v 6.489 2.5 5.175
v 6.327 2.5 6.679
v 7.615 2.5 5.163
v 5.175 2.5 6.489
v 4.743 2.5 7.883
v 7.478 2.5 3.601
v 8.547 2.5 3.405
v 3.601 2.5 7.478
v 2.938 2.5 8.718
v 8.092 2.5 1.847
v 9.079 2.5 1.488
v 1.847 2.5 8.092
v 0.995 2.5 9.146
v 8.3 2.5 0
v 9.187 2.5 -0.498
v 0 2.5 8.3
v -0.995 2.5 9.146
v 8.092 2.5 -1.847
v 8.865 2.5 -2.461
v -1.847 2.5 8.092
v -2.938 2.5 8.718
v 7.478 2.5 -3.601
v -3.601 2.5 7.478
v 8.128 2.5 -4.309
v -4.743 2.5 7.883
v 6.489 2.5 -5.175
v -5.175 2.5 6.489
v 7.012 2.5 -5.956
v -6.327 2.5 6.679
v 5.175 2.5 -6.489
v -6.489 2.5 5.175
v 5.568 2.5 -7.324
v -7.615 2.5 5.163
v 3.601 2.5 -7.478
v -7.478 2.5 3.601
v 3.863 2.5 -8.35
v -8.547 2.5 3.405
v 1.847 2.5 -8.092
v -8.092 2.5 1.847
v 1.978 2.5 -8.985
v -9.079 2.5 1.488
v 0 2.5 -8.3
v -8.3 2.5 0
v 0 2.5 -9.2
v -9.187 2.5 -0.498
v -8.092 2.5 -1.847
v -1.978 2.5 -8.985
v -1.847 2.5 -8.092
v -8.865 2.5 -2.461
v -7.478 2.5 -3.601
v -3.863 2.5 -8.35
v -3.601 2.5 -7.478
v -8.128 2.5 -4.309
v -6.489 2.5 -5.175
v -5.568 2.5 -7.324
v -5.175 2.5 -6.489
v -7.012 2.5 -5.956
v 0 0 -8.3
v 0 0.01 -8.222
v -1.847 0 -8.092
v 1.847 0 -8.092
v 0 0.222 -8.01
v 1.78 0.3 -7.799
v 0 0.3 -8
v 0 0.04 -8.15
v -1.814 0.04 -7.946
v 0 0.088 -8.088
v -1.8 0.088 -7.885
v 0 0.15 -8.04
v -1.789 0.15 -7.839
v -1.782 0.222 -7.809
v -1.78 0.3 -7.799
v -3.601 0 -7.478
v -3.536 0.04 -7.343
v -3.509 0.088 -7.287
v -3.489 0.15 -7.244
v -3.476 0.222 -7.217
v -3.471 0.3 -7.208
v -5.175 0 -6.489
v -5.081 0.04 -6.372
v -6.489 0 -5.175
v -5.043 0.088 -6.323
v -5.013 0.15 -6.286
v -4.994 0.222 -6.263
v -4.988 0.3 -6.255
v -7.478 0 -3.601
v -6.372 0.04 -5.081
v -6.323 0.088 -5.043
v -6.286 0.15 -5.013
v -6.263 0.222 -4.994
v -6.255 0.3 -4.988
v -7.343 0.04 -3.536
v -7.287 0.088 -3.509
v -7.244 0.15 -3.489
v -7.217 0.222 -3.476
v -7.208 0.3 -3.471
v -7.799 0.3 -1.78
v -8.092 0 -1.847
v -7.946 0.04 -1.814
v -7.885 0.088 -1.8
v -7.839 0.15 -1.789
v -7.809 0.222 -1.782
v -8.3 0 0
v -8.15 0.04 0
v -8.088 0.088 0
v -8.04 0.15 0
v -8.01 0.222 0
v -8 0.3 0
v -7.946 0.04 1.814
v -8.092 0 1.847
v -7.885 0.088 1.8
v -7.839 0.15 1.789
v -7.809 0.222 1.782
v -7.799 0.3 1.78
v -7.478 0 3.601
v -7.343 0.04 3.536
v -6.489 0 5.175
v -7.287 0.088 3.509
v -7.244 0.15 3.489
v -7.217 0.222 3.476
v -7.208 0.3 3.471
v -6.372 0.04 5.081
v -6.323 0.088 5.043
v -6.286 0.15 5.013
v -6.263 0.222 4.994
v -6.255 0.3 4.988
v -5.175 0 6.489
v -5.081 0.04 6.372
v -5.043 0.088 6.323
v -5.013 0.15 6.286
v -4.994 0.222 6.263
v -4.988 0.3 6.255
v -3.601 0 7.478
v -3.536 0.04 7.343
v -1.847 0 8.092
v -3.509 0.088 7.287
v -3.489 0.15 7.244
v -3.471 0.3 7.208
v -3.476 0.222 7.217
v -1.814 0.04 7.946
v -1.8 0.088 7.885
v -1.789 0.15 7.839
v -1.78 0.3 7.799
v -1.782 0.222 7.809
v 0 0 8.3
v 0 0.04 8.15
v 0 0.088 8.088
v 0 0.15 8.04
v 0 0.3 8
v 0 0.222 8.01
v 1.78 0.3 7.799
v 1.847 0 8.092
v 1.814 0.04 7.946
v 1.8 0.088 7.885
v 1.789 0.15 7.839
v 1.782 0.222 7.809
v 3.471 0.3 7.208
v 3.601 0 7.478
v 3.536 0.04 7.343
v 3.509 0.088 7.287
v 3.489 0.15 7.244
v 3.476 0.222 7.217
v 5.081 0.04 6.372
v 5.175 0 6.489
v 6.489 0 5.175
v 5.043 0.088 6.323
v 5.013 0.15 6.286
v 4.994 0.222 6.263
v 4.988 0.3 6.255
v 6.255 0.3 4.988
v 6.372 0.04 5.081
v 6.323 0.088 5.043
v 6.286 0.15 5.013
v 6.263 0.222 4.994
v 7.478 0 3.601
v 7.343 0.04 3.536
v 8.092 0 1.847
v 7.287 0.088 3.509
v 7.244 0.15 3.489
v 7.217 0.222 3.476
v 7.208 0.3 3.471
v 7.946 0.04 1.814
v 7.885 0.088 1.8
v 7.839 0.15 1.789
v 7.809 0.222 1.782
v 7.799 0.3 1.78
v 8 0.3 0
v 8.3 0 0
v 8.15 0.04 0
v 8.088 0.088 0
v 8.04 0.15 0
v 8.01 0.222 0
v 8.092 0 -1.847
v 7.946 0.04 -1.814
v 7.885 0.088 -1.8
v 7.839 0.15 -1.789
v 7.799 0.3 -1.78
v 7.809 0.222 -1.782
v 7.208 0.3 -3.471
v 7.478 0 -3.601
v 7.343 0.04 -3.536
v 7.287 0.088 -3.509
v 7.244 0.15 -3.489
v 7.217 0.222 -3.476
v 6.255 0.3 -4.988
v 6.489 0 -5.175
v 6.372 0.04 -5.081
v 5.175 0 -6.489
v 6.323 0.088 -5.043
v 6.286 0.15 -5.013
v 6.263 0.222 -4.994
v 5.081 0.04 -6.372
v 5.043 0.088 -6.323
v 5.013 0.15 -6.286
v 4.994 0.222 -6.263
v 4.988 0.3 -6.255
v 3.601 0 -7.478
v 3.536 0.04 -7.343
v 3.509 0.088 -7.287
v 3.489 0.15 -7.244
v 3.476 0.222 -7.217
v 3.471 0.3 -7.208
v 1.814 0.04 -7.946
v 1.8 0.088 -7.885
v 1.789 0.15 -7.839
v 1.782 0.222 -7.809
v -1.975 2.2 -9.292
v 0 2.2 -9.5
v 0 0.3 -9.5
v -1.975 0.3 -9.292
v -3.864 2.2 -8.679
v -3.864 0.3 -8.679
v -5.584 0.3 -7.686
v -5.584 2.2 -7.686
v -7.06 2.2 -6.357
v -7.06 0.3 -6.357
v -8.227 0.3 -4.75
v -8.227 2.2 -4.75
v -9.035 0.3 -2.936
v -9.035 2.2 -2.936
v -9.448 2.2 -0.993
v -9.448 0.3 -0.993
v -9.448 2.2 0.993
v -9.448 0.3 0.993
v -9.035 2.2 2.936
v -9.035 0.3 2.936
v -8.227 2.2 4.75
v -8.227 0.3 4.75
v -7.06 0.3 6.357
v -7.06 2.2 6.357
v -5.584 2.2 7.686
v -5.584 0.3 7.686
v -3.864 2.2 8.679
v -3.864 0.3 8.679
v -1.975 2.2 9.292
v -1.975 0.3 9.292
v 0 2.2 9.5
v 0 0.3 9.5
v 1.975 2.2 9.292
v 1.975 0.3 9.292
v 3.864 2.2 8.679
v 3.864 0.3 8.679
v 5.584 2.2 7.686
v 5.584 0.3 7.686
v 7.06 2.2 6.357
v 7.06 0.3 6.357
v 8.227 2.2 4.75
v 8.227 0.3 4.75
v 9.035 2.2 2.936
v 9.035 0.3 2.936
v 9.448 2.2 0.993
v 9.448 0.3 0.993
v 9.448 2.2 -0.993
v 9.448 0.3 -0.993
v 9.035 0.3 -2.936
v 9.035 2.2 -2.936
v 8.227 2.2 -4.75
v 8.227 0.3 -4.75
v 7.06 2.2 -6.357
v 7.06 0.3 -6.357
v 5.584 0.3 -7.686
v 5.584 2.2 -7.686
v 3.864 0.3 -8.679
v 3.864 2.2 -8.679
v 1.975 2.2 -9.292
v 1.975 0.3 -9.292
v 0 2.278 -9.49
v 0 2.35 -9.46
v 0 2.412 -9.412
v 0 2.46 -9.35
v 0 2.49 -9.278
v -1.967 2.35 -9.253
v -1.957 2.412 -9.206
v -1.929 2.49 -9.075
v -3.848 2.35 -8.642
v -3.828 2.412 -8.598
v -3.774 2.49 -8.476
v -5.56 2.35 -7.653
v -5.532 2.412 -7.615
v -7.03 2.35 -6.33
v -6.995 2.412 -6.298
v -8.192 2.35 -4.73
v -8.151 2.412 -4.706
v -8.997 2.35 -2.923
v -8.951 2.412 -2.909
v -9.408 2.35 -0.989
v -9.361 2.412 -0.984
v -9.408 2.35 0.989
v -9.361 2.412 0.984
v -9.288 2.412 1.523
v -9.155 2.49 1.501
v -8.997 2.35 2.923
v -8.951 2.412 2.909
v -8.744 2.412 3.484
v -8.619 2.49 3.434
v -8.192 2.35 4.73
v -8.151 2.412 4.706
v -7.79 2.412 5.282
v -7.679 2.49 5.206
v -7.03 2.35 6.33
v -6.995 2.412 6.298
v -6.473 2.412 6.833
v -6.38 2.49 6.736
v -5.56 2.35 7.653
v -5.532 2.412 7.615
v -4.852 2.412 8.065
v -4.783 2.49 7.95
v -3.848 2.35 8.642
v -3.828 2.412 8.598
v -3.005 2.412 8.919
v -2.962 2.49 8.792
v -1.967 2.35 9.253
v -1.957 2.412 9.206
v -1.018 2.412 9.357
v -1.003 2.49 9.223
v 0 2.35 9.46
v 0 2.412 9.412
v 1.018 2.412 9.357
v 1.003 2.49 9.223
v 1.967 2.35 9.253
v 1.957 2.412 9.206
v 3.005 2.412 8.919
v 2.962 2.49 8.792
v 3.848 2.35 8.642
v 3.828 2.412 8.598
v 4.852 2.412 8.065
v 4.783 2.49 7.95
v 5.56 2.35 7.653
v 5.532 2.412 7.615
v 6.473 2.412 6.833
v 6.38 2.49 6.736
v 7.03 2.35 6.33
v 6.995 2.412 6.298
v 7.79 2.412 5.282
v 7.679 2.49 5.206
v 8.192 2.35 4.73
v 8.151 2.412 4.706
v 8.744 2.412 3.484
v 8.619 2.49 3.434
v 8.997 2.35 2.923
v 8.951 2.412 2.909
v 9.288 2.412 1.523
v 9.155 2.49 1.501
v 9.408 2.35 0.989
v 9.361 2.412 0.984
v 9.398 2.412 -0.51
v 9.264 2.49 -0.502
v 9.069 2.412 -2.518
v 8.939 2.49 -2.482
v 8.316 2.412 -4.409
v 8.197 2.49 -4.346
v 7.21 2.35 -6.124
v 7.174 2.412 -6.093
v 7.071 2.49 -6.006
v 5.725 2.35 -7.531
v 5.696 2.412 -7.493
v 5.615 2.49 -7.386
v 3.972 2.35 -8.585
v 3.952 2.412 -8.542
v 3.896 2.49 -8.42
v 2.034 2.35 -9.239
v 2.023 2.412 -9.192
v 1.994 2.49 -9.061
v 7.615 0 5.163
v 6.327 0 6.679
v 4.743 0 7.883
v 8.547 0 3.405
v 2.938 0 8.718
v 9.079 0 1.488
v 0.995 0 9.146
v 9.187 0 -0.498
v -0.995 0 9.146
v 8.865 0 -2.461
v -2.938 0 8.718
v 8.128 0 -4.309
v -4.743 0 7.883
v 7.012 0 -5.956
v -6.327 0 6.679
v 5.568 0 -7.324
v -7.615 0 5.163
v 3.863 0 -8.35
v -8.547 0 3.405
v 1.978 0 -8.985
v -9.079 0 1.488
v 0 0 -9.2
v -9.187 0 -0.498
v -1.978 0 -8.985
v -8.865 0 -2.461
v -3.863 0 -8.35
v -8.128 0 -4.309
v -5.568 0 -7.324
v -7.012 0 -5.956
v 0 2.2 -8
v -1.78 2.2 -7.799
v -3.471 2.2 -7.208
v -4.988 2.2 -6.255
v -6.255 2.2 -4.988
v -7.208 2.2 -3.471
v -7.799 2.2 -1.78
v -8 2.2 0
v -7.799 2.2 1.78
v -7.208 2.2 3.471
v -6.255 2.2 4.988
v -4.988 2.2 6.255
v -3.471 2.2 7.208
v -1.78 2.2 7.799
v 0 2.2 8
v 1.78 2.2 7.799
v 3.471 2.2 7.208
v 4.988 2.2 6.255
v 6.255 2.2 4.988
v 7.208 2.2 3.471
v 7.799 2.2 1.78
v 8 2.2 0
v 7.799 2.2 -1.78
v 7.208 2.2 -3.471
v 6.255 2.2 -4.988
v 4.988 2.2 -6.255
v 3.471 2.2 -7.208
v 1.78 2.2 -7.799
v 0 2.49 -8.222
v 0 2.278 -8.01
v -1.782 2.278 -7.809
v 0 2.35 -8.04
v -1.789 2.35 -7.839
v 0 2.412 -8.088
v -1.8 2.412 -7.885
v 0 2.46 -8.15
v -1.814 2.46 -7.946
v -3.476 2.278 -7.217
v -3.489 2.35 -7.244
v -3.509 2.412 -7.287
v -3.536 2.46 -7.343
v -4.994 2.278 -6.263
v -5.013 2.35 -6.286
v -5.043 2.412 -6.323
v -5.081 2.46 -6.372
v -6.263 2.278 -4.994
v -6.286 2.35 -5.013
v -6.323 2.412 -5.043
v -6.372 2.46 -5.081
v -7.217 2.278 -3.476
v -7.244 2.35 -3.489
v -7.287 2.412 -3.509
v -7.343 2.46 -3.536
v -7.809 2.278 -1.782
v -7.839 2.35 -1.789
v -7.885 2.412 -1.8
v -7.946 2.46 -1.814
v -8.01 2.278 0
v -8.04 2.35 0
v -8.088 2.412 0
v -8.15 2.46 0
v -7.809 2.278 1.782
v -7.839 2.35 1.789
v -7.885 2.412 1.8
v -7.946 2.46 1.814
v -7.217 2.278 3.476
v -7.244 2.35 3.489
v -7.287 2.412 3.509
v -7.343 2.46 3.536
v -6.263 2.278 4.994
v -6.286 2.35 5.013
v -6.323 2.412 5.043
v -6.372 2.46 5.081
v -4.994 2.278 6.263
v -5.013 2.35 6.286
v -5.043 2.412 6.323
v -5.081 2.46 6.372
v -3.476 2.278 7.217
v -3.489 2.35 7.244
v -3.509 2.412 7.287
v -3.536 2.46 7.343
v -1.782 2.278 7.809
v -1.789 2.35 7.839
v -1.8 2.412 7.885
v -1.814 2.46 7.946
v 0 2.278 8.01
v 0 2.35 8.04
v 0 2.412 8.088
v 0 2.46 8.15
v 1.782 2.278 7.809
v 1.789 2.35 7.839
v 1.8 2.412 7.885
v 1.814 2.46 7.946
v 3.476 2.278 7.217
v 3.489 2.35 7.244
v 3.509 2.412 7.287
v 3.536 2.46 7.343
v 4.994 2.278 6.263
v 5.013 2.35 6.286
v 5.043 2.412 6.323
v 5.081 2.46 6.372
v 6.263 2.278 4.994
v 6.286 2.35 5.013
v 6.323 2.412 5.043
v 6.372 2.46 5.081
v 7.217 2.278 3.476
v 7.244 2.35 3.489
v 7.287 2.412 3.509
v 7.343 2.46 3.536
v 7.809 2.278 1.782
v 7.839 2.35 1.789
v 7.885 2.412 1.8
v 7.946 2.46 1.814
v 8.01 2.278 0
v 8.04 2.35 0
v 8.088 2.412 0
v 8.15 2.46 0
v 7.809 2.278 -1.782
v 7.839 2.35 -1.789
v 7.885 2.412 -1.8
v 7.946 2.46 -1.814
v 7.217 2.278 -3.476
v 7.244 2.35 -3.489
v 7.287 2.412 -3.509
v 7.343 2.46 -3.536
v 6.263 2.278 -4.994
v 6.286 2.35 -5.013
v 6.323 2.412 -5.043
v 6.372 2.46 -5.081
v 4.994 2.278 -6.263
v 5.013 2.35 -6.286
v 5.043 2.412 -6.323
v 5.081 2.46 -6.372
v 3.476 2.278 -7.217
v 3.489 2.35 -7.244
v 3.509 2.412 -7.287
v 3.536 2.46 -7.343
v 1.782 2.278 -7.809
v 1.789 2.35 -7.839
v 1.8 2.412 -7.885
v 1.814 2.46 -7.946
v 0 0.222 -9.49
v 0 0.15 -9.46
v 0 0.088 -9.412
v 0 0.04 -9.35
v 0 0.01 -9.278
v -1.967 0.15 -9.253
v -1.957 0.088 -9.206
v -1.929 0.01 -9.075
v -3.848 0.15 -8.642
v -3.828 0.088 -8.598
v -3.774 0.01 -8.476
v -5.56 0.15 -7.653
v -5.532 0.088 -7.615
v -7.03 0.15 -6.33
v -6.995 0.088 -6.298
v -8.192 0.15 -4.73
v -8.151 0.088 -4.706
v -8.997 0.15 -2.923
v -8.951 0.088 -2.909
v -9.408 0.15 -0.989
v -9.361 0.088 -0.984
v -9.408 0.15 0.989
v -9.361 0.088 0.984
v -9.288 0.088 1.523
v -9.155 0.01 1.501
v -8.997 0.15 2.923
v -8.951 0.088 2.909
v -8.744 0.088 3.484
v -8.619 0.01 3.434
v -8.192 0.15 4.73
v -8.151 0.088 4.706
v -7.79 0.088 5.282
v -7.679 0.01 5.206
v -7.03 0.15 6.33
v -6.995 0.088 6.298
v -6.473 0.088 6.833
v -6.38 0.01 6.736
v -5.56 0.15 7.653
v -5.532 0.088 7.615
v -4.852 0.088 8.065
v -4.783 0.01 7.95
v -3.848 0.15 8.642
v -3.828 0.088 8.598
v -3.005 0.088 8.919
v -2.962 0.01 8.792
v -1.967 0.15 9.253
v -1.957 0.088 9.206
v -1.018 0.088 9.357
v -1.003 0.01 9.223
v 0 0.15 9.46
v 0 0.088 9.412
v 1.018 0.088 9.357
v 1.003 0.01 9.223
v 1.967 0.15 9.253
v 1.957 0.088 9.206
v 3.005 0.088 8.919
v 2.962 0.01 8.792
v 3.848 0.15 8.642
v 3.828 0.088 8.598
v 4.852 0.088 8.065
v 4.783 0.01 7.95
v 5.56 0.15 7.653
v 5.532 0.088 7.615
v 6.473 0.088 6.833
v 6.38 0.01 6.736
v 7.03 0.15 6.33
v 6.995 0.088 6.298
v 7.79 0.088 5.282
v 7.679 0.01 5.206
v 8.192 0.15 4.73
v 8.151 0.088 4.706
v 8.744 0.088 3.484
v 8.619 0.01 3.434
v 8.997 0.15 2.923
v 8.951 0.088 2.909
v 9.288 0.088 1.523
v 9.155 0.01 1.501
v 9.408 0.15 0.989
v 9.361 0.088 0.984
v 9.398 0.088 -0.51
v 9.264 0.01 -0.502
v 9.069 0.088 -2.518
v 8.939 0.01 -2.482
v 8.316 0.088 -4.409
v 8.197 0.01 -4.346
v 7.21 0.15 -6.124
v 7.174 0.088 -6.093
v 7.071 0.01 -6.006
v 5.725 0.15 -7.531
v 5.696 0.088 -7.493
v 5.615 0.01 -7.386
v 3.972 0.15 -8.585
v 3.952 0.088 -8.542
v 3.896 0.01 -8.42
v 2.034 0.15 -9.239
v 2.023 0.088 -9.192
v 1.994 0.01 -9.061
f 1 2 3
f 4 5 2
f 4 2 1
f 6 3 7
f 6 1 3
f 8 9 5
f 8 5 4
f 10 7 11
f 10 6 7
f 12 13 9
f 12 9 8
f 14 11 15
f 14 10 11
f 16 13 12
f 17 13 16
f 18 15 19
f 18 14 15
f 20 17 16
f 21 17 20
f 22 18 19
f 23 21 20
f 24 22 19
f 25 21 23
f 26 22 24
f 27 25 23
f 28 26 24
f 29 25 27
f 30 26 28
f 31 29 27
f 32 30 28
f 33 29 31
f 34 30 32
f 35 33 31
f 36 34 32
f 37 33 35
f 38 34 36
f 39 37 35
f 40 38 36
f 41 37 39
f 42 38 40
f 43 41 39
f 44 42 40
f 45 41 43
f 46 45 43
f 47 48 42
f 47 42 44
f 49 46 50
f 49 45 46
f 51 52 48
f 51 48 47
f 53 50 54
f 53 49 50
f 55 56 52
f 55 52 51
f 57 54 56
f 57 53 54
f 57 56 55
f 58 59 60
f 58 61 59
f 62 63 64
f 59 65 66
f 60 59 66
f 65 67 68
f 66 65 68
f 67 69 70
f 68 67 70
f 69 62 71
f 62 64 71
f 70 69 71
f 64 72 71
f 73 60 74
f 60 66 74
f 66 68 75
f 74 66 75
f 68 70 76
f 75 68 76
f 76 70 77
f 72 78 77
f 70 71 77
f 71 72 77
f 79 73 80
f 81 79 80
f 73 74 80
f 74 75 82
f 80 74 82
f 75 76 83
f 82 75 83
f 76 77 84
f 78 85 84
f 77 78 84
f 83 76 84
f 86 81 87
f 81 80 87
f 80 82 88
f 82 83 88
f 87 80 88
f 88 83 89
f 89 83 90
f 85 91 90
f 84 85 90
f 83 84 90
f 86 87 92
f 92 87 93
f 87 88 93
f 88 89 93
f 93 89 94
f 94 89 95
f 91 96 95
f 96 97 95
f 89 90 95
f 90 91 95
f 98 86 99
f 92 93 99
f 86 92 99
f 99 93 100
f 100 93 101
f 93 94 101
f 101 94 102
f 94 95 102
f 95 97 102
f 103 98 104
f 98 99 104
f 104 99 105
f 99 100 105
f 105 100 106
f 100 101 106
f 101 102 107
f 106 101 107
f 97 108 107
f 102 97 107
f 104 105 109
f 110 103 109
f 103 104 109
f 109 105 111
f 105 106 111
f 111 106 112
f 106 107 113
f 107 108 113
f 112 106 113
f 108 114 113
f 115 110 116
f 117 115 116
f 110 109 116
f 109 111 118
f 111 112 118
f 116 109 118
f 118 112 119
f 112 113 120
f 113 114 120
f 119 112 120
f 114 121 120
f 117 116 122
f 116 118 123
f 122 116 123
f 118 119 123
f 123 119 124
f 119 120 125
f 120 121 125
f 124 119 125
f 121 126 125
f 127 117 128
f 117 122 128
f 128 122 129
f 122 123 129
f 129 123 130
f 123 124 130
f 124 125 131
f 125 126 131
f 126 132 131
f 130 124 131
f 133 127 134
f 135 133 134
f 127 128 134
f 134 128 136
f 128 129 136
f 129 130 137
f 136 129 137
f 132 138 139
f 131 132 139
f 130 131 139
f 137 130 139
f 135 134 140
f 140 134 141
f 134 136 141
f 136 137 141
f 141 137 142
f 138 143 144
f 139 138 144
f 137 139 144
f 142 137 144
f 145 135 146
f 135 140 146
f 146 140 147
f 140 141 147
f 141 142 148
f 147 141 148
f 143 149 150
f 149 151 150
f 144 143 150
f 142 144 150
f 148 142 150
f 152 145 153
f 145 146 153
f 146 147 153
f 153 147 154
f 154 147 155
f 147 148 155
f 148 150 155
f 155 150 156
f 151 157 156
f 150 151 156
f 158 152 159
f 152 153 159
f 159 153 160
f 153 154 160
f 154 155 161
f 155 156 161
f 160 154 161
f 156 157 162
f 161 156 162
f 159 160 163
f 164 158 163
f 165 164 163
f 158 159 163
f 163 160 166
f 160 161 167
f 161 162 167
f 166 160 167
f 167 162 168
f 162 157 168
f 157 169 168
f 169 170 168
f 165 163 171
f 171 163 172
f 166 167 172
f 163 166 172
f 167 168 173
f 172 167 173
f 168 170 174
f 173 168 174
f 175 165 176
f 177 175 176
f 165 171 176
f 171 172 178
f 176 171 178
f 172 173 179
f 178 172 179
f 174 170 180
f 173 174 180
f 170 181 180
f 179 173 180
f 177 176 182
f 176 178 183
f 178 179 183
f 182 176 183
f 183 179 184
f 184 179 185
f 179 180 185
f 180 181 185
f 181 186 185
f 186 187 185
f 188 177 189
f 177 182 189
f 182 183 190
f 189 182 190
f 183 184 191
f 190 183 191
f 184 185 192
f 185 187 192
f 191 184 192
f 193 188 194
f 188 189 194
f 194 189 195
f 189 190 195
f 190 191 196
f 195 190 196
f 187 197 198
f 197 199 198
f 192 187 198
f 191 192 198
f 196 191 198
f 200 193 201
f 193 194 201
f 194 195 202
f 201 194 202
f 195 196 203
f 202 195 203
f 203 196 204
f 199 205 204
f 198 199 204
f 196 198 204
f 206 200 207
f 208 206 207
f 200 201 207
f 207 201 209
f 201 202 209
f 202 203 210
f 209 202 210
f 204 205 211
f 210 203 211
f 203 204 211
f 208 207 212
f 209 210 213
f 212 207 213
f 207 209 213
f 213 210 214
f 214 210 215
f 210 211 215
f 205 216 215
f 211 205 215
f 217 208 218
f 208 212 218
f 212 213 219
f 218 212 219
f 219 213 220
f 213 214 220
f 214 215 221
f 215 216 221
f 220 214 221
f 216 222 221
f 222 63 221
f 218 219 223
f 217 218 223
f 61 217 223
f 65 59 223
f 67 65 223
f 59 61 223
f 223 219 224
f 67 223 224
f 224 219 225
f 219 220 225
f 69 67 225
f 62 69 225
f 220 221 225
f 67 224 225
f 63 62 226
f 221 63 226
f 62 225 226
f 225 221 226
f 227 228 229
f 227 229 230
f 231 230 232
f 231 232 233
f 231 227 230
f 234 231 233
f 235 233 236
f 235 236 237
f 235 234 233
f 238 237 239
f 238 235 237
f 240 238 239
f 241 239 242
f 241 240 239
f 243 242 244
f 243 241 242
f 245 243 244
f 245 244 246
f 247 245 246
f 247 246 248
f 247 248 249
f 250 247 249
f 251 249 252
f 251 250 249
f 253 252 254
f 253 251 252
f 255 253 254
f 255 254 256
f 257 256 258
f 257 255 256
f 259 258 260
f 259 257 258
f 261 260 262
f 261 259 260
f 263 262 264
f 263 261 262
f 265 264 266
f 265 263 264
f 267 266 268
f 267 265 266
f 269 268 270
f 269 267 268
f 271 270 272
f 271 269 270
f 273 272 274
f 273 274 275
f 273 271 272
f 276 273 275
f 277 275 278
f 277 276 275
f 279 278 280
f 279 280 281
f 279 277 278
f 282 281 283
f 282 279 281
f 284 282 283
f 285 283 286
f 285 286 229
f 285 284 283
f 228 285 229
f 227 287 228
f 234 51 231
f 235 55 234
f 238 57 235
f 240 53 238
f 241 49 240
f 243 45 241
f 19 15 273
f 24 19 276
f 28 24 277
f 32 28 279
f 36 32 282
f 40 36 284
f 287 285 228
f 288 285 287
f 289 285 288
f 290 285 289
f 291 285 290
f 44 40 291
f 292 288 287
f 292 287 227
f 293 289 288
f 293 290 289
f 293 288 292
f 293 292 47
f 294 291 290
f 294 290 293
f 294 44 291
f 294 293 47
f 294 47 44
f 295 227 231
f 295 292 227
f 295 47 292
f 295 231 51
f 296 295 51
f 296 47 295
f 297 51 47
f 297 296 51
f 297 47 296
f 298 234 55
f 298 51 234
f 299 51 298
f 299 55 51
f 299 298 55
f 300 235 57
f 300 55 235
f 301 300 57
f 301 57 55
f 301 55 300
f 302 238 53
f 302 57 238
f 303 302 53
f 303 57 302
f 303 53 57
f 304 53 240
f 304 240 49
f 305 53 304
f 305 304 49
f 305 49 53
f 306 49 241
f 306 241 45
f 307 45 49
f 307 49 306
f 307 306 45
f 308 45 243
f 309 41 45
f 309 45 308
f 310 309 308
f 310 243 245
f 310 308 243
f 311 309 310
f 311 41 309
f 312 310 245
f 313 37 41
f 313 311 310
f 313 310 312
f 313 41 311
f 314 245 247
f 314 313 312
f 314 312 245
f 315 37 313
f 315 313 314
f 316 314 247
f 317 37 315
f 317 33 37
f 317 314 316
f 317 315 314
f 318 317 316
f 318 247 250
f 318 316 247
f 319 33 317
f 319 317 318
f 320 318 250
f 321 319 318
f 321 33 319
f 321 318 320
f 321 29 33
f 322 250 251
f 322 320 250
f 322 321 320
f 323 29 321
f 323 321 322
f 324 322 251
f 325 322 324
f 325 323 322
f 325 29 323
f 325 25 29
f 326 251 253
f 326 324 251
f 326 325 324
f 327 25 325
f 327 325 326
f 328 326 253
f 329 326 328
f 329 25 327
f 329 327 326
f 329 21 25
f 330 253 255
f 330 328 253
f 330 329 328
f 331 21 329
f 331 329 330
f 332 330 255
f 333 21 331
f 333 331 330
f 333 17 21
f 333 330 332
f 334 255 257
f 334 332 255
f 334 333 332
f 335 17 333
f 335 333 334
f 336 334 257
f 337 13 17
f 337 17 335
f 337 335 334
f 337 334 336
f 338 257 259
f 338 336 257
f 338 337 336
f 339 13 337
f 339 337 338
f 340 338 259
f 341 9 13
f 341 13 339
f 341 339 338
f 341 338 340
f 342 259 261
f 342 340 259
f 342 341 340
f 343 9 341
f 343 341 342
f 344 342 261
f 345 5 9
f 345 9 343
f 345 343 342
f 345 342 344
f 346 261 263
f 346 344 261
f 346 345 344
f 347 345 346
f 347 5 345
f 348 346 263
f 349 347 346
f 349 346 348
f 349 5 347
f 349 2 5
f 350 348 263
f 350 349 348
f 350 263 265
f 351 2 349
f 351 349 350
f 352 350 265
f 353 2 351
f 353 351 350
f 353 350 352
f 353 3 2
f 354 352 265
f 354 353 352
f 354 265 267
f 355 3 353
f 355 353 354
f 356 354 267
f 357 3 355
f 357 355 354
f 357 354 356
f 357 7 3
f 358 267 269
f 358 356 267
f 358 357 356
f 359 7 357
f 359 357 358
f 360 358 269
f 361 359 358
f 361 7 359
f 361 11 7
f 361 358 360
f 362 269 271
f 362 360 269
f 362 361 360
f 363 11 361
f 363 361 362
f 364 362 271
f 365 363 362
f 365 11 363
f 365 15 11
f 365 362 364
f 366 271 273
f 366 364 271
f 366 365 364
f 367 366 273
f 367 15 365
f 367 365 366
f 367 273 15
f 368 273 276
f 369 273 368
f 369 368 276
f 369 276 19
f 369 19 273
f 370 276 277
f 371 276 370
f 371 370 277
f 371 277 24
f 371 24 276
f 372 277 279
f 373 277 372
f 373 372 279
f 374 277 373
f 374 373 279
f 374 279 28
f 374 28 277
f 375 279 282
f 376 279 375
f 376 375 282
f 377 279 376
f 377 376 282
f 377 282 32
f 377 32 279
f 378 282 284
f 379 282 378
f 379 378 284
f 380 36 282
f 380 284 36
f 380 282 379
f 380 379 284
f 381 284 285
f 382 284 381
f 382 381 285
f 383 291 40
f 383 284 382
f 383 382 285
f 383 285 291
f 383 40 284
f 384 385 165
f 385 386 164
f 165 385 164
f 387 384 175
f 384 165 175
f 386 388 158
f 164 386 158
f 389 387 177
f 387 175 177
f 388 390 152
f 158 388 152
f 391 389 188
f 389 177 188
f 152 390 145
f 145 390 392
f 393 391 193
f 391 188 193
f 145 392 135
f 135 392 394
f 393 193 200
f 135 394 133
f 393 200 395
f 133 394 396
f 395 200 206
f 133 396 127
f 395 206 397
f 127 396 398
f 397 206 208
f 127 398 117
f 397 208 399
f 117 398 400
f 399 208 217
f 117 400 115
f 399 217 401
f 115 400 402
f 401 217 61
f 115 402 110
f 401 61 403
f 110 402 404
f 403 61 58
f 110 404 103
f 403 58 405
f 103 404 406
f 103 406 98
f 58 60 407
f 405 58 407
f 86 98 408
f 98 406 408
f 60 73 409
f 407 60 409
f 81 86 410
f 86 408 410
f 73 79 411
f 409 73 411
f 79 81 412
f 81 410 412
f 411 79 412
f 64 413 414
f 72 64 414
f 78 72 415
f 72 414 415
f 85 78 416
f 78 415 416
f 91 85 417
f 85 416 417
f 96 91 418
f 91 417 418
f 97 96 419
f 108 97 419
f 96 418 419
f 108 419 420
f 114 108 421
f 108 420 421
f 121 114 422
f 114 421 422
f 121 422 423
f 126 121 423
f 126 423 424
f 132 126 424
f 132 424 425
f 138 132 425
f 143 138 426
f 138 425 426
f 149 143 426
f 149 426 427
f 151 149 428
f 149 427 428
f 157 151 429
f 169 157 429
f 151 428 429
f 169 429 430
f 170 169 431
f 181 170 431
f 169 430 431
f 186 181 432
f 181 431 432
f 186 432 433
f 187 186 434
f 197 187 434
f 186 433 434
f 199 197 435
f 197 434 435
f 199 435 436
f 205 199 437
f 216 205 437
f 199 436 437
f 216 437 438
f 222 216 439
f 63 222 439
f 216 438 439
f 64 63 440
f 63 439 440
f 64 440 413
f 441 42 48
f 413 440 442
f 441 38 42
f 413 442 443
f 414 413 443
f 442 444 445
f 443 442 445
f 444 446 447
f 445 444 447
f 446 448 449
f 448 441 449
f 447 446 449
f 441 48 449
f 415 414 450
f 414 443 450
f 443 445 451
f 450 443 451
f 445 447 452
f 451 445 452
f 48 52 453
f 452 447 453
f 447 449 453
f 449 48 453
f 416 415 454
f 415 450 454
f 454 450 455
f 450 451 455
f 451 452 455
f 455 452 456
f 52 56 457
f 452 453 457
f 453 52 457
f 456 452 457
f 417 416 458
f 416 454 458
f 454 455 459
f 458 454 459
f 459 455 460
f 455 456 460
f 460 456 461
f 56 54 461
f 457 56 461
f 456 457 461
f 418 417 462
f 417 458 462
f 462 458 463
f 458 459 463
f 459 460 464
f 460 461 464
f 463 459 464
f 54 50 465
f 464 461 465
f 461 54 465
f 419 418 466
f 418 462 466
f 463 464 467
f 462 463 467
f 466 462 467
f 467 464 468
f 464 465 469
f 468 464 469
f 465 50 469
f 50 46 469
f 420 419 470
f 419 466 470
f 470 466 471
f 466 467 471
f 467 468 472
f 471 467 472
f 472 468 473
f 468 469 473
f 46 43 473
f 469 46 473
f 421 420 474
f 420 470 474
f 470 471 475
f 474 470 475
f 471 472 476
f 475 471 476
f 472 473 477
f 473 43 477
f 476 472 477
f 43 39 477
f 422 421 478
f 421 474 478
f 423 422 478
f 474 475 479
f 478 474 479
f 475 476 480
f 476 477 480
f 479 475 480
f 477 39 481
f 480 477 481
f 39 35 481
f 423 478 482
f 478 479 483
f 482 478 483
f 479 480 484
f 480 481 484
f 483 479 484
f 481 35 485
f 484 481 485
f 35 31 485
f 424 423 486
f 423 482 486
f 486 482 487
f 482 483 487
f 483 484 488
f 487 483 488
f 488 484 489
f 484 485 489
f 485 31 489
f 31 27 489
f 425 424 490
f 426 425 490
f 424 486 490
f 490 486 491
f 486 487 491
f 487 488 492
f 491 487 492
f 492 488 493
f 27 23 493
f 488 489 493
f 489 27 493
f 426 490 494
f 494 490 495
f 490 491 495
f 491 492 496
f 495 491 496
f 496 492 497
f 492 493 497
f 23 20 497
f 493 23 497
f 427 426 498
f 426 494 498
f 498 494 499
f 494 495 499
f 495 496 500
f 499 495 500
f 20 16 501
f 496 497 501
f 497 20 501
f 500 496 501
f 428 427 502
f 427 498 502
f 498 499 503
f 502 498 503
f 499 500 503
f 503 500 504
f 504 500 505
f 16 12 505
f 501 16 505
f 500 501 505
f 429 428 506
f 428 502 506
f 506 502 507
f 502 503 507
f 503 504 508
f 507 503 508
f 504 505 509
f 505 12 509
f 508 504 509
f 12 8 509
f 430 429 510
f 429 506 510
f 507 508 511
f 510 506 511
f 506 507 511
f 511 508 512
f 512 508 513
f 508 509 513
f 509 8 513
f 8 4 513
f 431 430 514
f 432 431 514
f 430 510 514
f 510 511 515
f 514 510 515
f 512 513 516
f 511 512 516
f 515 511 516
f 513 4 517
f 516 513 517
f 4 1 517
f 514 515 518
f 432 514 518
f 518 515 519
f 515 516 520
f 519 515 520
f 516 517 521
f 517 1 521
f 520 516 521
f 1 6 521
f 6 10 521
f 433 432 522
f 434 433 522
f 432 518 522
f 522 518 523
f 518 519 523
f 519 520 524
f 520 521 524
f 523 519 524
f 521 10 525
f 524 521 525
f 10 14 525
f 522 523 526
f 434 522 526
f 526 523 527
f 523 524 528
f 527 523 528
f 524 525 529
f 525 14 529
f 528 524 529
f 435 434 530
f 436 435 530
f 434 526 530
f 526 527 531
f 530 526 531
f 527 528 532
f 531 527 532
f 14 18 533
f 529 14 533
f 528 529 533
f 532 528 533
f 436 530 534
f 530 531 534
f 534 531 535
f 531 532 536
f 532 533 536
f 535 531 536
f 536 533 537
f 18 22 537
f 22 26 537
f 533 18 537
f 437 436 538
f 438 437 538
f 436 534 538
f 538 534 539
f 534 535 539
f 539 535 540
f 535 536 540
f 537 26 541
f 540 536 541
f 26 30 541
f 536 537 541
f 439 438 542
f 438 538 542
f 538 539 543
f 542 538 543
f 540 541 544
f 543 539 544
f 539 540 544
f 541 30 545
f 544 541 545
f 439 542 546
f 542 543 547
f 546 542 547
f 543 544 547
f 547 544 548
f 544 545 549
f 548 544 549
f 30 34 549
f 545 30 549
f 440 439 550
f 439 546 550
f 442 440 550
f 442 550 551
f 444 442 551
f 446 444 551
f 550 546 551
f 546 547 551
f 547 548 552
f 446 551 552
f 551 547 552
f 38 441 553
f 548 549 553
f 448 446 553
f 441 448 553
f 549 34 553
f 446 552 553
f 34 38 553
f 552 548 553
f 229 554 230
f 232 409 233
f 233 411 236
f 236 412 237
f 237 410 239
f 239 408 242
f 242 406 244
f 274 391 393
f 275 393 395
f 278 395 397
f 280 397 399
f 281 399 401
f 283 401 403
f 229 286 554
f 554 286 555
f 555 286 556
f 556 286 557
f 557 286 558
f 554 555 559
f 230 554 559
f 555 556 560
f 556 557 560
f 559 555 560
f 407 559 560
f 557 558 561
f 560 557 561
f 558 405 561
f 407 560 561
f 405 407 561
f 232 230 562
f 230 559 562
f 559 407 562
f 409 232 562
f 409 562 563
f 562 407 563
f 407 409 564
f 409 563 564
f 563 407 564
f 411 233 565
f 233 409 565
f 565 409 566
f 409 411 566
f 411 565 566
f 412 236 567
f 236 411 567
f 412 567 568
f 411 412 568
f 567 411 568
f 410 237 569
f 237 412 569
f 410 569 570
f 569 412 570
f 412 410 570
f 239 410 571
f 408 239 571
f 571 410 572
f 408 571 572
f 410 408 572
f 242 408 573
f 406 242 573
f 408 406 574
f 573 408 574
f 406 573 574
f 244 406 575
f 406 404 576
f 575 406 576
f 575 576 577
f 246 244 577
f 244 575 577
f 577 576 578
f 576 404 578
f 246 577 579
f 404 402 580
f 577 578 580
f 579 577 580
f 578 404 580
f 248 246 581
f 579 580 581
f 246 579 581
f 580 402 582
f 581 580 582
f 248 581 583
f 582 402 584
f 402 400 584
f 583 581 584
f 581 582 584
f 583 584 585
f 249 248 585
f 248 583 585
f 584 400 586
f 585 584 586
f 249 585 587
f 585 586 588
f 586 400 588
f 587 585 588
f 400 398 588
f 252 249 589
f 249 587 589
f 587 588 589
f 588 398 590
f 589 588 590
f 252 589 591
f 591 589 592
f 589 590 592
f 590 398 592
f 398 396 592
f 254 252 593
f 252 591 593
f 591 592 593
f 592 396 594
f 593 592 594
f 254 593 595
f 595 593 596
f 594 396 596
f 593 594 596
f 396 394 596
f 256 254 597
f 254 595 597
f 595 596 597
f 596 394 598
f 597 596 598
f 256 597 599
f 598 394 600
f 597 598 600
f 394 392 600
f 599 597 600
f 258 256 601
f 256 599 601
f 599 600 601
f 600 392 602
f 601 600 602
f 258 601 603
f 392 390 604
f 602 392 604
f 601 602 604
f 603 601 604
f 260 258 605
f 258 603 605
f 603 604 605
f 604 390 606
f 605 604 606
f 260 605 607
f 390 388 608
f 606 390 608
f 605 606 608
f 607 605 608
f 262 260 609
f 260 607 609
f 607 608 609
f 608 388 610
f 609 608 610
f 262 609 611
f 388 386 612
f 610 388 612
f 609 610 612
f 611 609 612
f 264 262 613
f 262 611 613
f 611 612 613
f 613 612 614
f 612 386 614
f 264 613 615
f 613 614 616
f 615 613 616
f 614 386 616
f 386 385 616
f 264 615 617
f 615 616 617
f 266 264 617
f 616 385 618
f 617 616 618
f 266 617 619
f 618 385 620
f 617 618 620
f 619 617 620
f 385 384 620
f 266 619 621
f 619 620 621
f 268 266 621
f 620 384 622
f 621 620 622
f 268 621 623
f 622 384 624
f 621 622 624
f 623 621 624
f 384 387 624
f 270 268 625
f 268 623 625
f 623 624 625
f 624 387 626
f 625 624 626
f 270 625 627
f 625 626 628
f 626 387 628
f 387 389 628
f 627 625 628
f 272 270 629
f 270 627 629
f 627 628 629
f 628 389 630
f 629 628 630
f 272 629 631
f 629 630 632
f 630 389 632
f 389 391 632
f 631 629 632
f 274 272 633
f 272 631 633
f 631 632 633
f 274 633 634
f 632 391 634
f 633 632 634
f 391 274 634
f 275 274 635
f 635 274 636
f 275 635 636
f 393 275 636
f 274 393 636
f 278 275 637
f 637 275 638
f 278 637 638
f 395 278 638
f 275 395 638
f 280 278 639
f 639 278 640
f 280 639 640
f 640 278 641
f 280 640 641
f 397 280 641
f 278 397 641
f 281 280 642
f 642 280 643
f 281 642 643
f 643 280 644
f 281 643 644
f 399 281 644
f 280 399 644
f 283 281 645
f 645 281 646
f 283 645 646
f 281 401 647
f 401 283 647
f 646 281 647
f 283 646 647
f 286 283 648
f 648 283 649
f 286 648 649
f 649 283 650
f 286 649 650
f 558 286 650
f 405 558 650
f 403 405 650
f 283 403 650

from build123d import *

# Parameters (mm, degrees)
SKETCH_1_W = 1.5
SKETCH_1_H = 2.5
FILLET_1_R = 0.3


with BuildPart() as part:
    # Эскиз1 → Повернуть1 (revolve)
    with BuildSketch(Plane.XY, mode=Mode.PRIVATE) as revolve_1_sk:
        with Locations((-8.75, 1.25)):
            Rectangle(SKETCH_1_W, SKETCH_1_H)
    revolve(revolve_1_sk.sketch.rotate(Axis((0, 0, 0), (0, 1, 0)), 270), axis=Axis((0, 0, 0), (0, 1, 0)))

    # Скругление1
    fillet_1_edges = [part.edges().sort_by_distance(p)[0] for p in [
        (0, 2.5, 9.5),
        (0, 2.5, 8),
        (0, 0, 8),
        (0, 0, 9.5),
    ]]
    fillet(fillet_1_edges, radius=FILLET_1_R)


solid = part.part
